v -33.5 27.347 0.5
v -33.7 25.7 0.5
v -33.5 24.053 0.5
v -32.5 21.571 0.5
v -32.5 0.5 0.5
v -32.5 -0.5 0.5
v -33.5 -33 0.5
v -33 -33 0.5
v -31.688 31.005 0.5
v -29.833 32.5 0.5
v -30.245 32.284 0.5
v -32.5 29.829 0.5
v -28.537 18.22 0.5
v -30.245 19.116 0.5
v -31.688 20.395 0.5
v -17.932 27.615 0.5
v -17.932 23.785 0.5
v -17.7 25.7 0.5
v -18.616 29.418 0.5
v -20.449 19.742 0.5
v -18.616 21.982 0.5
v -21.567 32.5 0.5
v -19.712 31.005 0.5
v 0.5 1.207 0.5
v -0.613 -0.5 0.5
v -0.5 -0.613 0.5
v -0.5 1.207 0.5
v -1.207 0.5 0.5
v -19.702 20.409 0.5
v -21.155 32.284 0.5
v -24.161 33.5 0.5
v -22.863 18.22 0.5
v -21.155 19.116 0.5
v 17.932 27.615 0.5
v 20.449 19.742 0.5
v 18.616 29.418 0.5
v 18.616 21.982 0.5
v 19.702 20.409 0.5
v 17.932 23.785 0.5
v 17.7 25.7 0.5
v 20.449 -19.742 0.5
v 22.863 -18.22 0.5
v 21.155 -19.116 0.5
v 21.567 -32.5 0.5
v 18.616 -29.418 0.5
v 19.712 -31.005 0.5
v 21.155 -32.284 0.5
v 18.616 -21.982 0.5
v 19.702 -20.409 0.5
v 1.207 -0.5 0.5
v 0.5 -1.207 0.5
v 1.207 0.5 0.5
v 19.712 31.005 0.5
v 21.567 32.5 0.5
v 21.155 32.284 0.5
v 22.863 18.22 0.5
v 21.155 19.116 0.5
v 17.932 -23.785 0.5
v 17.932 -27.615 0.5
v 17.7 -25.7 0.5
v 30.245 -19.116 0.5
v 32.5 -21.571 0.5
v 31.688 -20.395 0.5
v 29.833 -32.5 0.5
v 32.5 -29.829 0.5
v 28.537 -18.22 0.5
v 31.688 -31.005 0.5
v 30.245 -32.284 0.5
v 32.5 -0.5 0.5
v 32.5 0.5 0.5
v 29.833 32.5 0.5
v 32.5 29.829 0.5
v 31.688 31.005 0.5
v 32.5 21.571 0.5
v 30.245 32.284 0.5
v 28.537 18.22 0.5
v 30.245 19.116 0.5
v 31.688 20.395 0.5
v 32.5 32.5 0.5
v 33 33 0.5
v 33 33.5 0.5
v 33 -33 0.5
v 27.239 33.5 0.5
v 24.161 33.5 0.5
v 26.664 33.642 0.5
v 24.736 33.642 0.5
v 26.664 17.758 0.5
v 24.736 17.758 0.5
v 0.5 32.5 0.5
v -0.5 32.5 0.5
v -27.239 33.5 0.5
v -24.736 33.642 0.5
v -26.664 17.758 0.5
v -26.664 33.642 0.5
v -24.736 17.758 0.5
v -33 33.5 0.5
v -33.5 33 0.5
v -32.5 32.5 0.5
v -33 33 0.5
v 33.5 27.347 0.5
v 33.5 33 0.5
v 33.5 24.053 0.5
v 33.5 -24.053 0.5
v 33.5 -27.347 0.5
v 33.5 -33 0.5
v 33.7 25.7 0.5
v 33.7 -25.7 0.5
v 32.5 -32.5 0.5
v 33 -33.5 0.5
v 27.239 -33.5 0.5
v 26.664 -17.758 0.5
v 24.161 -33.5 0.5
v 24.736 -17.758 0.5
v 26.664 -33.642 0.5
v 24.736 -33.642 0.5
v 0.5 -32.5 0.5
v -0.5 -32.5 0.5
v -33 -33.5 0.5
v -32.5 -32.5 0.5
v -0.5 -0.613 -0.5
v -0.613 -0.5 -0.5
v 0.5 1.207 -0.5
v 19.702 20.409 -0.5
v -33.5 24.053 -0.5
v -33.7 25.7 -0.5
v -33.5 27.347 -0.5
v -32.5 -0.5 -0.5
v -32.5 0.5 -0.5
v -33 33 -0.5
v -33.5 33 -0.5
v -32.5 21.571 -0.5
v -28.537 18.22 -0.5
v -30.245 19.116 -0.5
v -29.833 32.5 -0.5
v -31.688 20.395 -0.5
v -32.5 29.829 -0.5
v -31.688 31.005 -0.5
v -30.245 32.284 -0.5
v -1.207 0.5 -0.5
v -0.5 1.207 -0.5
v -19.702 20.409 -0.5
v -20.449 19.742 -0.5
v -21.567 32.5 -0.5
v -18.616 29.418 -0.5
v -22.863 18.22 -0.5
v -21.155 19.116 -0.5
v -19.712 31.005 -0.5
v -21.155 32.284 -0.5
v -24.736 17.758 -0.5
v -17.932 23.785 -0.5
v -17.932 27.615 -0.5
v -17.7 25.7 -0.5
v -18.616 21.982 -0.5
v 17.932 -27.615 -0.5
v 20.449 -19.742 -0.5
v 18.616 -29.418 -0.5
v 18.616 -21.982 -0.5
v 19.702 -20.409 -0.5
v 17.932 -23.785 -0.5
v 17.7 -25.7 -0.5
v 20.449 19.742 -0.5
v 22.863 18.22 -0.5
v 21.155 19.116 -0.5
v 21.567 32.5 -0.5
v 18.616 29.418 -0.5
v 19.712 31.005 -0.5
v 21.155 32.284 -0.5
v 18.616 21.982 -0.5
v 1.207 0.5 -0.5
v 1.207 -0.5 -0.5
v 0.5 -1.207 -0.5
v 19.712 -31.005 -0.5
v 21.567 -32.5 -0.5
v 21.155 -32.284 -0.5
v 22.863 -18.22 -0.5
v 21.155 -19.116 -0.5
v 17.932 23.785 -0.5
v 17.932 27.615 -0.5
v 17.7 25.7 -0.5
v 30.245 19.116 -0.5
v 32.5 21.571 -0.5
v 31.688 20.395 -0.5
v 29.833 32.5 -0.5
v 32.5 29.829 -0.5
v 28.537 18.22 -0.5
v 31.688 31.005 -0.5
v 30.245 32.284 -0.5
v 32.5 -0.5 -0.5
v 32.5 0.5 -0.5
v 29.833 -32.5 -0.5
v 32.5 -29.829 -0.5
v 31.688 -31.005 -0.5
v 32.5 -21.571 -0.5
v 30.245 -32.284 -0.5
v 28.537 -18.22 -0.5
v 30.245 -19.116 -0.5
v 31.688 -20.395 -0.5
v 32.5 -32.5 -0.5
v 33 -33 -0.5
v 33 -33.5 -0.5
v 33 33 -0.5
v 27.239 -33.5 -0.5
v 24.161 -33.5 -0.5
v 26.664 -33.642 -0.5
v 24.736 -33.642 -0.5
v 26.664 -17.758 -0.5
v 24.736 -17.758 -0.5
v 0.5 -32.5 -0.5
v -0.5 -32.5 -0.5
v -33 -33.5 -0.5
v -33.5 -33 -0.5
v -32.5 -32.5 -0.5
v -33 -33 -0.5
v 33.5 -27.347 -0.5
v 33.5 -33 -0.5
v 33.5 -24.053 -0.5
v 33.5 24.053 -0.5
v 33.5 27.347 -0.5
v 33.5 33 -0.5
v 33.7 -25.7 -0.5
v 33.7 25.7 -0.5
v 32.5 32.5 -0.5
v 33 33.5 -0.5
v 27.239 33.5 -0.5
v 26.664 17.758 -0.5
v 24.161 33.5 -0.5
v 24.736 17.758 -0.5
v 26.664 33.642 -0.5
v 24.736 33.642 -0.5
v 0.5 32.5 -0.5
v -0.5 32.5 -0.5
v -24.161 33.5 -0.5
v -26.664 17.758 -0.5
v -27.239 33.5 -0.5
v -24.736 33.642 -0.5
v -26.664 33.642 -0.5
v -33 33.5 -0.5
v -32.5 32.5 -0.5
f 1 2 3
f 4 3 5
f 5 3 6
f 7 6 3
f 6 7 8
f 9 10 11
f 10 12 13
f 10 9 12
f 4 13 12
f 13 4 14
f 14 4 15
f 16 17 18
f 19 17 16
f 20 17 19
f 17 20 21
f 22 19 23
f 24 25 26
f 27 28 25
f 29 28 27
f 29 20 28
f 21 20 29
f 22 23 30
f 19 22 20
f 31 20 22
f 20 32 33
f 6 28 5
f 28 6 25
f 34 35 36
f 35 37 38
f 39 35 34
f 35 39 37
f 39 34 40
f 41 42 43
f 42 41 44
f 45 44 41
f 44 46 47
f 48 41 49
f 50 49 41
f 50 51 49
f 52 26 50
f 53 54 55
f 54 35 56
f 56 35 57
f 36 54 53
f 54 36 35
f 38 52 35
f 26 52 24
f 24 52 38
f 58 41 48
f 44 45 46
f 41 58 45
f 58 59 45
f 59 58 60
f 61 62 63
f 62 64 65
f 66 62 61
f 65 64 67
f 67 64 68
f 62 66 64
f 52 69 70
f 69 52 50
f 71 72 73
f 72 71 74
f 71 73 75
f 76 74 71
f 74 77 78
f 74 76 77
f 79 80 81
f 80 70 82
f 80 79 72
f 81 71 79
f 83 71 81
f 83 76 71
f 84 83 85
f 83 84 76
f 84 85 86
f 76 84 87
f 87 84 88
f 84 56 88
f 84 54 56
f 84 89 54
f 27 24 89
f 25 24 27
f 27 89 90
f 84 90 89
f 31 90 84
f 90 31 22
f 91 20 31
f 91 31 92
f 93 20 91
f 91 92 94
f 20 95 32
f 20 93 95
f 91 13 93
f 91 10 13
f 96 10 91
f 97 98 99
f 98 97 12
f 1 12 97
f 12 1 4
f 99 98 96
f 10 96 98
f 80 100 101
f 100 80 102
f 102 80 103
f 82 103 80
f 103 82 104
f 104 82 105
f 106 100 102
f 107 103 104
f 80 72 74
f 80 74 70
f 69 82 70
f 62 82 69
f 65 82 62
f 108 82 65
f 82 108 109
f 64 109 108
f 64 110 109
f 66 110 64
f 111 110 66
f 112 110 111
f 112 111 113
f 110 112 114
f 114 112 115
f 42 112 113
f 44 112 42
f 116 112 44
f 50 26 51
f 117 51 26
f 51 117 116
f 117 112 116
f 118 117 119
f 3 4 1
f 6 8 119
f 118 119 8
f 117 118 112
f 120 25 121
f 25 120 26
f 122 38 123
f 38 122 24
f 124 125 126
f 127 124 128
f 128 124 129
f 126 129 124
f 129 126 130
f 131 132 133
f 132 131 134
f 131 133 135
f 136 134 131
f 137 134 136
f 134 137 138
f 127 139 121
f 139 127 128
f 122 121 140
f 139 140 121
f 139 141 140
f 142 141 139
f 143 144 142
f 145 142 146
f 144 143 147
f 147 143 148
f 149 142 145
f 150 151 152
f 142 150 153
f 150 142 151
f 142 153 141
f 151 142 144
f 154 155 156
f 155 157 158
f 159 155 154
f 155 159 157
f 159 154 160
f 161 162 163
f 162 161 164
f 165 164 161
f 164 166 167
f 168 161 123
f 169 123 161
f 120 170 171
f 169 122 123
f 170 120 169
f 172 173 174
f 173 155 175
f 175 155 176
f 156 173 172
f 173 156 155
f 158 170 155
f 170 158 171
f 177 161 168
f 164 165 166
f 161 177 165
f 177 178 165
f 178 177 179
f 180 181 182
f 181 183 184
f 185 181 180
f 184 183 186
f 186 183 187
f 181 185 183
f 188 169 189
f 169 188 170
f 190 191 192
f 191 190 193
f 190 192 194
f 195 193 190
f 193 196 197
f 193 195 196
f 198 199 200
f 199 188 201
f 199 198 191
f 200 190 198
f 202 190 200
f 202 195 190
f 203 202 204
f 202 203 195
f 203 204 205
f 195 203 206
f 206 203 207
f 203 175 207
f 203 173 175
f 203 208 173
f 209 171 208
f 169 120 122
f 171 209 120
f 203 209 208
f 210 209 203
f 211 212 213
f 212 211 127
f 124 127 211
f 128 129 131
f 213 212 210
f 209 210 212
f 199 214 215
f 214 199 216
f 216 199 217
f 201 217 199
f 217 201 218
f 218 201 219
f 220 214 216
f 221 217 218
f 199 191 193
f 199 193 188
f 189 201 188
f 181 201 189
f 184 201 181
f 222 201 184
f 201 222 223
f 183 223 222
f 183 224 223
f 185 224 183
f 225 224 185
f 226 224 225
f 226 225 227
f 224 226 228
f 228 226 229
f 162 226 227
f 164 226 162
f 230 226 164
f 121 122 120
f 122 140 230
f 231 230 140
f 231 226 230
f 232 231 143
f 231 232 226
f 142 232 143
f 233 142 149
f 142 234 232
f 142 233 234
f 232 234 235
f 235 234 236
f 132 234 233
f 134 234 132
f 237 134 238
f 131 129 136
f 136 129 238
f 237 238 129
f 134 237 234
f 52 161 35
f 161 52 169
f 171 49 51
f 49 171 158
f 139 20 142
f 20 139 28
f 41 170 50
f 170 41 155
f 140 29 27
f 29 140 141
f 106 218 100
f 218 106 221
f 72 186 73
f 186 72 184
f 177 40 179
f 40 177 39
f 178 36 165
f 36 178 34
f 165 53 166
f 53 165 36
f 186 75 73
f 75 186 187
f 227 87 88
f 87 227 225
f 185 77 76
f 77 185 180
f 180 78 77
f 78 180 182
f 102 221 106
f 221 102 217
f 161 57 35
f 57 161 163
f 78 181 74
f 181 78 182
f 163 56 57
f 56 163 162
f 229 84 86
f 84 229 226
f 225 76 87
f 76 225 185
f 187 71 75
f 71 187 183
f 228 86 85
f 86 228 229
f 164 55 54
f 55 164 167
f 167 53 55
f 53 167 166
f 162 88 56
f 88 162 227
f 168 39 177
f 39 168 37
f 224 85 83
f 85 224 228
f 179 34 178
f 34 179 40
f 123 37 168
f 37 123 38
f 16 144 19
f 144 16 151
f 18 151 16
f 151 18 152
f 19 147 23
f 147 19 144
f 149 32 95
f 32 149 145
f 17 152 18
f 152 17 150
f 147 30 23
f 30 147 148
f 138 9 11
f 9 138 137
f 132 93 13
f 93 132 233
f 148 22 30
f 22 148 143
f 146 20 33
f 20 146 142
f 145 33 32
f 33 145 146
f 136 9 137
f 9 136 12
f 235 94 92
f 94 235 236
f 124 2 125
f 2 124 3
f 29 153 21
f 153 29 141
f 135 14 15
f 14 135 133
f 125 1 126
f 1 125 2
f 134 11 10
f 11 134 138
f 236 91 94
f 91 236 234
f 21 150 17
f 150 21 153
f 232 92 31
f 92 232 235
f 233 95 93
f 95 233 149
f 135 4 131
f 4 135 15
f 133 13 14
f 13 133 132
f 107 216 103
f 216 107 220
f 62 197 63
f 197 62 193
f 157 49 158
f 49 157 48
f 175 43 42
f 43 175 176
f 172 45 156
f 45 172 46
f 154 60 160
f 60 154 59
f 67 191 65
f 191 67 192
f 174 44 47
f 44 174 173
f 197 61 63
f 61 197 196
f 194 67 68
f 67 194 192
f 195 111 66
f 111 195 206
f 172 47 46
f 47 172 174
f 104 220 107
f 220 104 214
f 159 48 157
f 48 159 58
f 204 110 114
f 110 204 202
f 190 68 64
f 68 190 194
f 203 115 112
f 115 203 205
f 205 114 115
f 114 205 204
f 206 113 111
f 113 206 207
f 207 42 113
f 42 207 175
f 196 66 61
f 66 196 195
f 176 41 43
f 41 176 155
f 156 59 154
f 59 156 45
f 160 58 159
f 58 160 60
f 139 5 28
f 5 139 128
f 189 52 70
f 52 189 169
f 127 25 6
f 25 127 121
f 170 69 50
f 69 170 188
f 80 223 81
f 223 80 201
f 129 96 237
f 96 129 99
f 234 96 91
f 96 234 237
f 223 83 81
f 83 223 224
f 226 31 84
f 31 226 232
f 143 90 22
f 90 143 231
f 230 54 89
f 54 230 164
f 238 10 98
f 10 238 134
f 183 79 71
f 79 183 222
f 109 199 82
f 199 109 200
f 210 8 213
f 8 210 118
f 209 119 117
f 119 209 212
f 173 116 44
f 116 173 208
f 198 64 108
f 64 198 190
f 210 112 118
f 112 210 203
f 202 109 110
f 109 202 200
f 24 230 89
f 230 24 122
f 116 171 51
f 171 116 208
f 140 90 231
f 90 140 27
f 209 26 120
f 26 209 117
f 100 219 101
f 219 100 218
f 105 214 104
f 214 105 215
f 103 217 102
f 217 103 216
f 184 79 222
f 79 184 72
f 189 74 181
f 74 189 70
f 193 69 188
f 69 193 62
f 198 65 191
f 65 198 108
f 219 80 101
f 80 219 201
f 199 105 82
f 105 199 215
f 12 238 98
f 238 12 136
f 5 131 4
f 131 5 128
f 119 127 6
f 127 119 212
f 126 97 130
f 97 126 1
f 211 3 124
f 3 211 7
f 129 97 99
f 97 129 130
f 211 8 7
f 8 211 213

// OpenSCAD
union(){
translate([15,15,0])rotate([0,0,45])cube([44, 1, 1], center=true);
translate([0,0,0])rotate([0,0,45])cube([1, 88, 1], center=true);
translate([25.7,25.7,0])rotate([0,0,0]) cylinder(r=8, h=1, center=true);
translate([-25.7,25.7,0])rotate([0,0,0]) cylinder(r=8, h=1, center=true);
translate([25.7,-25.7,0])rotate([0,0,0]) cylinder(r=8, h=1, center=true);
*translate([-25.7,-25.7,0])rotate([0,0,0]) cylinder(r=8, h=1, center=true);
}//3dot marker



union(){
    translate([0,0,0])cube([66, 1, 1], center=true);

    translate([0,33,0])cube([66, 1, 1], center=true);
    translate([0,-33,0])cube([66, 1, 1], center=true);
    translate([0,0,0])cube([1, 66, 1], center=true);

    translate([33,0,0])cube([1, 66, 1], center=true);
    translate([-33,0,0])cube([1, 66, 1], center=true);
} //grid marker
